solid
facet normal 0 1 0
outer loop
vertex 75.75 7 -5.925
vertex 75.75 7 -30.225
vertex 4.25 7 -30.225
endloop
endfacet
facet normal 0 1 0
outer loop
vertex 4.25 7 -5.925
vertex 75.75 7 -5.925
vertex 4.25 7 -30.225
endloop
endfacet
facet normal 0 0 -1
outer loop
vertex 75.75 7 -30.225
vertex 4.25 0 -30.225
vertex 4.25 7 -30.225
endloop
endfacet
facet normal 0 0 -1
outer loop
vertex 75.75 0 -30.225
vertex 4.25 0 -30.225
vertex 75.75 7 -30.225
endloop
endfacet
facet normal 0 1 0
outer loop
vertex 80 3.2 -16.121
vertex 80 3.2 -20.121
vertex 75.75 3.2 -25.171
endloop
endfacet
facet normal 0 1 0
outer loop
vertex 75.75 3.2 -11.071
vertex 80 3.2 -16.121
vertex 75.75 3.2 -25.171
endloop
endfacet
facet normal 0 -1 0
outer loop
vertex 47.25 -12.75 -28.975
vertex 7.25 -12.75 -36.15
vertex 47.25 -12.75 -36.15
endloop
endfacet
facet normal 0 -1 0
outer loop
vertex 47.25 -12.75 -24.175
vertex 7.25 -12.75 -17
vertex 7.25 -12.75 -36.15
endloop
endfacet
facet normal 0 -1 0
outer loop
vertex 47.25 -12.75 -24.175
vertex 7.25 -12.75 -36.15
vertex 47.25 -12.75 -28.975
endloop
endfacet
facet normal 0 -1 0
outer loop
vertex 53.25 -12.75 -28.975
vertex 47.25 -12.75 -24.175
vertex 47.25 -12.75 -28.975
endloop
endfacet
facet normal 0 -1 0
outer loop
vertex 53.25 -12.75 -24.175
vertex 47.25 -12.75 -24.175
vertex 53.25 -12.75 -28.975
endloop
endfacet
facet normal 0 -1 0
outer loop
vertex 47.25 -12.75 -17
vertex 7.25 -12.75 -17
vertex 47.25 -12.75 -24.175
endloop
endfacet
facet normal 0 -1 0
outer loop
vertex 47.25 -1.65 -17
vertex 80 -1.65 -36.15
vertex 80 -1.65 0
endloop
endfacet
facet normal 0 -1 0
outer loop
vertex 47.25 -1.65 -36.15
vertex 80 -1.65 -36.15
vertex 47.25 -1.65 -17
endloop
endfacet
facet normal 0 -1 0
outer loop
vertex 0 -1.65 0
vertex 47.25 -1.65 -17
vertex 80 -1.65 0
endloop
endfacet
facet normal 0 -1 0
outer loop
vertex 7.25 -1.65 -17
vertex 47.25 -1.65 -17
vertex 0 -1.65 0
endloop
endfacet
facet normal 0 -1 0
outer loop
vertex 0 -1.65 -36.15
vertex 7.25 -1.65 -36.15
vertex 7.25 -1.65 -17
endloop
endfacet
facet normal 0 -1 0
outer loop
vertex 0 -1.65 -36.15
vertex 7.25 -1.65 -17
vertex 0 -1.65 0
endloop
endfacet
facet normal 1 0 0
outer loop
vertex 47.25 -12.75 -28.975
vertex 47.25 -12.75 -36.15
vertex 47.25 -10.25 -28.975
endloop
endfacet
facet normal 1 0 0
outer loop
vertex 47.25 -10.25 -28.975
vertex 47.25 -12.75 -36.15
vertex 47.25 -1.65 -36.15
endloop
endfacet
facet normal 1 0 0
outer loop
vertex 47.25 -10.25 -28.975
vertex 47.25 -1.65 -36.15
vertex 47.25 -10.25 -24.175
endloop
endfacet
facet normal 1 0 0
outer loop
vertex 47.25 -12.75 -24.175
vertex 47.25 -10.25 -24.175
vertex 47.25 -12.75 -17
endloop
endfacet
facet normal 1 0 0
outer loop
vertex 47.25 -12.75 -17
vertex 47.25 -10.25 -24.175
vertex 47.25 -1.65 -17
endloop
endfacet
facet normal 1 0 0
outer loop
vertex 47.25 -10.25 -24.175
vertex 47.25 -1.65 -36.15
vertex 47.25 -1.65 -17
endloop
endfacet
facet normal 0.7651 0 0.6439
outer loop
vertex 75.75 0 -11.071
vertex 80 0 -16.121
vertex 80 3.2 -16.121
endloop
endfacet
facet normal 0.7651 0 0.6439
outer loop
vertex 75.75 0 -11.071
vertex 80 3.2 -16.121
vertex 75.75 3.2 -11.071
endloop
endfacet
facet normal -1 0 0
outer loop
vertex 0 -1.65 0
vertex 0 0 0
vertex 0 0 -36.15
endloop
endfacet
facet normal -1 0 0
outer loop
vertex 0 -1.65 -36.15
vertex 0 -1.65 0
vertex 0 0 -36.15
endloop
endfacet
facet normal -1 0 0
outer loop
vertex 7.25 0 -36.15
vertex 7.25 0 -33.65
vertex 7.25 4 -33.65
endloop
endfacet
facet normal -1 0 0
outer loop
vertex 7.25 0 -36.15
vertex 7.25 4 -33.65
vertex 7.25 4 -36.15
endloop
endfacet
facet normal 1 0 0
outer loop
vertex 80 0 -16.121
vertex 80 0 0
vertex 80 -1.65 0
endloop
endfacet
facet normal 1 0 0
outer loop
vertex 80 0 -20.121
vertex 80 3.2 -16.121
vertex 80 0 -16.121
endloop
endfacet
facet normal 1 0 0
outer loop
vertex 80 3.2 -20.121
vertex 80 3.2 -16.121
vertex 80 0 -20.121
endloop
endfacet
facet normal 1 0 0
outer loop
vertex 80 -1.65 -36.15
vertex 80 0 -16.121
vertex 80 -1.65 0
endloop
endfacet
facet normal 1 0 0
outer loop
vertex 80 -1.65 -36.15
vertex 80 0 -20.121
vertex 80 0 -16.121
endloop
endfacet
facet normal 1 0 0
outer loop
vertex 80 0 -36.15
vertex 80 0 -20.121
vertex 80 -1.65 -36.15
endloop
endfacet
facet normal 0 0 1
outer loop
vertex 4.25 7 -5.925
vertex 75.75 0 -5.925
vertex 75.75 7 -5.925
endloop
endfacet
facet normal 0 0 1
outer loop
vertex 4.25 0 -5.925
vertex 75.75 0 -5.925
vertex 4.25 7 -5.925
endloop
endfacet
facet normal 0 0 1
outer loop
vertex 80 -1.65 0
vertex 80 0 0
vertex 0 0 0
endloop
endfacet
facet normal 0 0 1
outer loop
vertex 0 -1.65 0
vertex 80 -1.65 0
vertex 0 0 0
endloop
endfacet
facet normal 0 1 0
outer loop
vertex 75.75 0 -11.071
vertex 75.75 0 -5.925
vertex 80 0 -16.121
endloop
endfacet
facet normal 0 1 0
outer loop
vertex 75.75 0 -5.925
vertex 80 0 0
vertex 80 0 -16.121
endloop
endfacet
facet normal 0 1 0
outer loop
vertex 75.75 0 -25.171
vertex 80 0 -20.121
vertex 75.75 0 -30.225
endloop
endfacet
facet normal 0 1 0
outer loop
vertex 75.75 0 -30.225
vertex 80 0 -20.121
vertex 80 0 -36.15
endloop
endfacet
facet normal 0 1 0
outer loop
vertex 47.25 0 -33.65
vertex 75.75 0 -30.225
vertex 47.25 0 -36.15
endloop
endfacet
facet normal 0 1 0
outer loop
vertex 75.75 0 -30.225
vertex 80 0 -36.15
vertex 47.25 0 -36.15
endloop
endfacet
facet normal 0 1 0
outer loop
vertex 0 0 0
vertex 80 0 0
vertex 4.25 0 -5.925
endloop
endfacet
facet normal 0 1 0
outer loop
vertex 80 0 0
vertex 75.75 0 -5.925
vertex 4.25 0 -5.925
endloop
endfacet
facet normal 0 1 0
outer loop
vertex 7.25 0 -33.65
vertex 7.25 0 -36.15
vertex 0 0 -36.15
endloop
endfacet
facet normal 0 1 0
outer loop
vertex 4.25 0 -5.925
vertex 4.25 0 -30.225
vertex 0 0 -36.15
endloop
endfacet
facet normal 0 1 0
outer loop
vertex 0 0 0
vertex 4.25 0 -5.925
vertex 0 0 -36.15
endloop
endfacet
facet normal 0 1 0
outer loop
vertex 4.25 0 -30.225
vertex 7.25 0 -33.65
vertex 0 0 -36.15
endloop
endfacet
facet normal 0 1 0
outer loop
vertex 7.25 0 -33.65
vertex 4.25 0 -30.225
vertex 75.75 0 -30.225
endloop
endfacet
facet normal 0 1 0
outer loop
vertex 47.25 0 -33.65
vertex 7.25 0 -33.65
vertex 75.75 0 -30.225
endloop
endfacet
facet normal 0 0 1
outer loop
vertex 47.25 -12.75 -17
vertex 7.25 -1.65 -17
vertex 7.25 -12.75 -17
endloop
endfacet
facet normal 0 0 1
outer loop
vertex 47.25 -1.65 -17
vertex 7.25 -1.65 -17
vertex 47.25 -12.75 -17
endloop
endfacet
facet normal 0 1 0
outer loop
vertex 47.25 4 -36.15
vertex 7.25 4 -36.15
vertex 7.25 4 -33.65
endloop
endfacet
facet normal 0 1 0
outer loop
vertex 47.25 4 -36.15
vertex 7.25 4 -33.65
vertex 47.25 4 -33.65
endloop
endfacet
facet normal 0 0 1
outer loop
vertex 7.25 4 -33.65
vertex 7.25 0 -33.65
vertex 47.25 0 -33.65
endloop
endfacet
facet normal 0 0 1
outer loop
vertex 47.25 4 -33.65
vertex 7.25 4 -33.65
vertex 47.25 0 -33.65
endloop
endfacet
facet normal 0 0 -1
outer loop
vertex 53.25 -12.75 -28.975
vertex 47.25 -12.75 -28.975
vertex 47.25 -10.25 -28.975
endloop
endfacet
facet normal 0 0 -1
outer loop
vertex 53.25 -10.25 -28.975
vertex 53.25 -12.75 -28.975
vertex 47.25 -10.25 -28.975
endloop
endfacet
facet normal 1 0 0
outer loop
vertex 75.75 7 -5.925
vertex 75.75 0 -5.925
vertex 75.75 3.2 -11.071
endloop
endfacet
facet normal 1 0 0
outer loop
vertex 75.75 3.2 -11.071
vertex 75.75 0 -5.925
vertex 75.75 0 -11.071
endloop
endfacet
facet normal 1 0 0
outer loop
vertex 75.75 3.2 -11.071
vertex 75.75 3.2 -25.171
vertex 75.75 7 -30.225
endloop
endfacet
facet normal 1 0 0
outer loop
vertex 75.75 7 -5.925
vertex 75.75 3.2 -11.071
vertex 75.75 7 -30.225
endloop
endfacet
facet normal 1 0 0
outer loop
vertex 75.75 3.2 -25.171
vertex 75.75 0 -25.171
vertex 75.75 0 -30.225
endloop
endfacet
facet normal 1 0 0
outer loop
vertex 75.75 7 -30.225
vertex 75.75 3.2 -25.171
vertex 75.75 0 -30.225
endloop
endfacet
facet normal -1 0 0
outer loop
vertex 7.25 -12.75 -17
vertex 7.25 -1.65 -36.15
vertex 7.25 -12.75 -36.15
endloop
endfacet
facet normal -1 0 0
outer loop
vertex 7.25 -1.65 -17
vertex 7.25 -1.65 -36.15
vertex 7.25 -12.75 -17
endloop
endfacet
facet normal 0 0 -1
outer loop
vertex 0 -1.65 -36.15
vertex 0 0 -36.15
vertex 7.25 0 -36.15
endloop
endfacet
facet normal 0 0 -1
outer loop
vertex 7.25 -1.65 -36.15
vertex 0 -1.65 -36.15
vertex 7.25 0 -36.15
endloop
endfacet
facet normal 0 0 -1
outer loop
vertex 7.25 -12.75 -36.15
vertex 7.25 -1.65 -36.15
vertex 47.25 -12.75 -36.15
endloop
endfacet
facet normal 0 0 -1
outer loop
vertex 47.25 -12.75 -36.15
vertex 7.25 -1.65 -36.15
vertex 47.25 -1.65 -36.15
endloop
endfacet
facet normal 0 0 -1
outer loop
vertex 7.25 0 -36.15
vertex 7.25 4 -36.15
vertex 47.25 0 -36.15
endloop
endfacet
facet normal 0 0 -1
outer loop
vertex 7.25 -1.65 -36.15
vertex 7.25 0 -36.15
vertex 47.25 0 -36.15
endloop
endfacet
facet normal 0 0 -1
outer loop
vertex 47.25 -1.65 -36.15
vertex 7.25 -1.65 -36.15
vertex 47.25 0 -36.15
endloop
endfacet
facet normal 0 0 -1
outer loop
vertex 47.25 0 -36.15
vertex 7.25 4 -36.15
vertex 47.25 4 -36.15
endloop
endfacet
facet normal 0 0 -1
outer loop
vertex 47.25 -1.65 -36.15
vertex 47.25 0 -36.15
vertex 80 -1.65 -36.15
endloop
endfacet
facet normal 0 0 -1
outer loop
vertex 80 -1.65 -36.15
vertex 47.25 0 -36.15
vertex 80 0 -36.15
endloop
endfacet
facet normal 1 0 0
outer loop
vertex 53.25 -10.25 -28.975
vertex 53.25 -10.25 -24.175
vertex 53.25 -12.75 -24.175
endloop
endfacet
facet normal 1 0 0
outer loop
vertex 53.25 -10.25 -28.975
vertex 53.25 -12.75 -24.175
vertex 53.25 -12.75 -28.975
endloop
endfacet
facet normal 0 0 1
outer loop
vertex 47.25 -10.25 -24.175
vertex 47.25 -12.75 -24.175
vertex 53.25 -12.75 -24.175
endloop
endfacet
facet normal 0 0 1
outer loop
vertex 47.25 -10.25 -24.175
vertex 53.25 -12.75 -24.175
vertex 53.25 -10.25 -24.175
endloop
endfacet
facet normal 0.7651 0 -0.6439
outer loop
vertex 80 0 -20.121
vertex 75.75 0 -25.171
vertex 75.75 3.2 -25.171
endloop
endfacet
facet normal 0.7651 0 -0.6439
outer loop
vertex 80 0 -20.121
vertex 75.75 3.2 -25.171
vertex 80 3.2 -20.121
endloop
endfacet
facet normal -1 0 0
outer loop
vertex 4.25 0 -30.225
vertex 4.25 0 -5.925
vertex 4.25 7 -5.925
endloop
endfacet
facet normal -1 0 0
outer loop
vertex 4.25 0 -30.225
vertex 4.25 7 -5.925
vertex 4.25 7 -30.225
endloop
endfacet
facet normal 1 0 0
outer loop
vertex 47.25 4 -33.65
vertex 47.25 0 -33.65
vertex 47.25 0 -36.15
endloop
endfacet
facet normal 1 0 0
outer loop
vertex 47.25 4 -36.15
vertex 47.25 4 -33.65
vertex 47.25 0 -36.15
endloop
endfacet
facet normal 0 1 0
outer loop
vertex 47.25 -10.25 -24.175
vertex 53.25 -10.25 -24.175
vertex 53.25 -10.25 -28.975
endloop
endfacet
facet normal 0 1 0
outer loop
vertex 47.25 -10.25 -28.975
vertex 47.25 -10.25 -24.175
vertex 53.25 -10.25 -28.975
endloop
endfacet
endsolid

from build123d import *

# Parameters (mm, degrees)
BOSS_EXTRUDE2_DEPTH = 1.65
BOSS_EXTRUDE3_DEPTH = 7
BOSS_EXTRUDE4_DEPTH = 3.2
SKETCH7_W           = 40
SKETCH7_H           = 2.5
BOSS_EXTRUDE5_DEPTH = 4
SKETCH8_W           = 40
SKETCH8_H           = 19.15
BOSS_EXTRUDE6_DEPTH = 11.1
SKETCH9_W           = 4.8
SKETCH9_H           = 2.5
BOSS_EXTRUDE7_DEPTH = 6


with BuildPart() as part:
    # Sketch3 → Boss-Extrude2 (new body)
    with BuildSketch(Plane(origin=(0, 0, 0), x_dir=(1, 0, 0), z_dir=(0, 1, 0))):
        Polygon((0, 0), (0, 36.15), (80, 36.15), (80, 20.120748629), (80, 16.120748629), (80, 0), align=None)
    extrude(amount=-BOSS_EXTRUDE2_DEPTH)

    # Sketch5 → Boss-Extrude3 (add)
    with BuildSketch(Plane(origin=(0, 0, 0), x_dir=(1, 0, 0), z_dir=(0, 1, 0))):
        Polygon((75.75, 11.070748629), (75.75, 5.925), (4.25, 5.925), (4.25, 30.225), (75.75, 30.225), (75.75, 25.170748629), align=None)
    extrude(amount=BOSS_EXTRUDE3_DEPTH)

    # Sketch6 → Boss-Extrude4 (add)
    with BuildSketch(Plane(origin=(0, 0, 0), x_dir=(1, 0, 0), z_dir=(0, 1, 0))):
        Polygon((80, 20.120748629), (80, 16.120748629), (75.75, 11.070748629), (75.75, 25.170748629), align=None)
    extrude(amount=BOSS_EXTRUDE4_DEPTH)

    # Sketch7 → Boss-Extrude5 (add)
    with BuildSketch(Plane(origin=(0, 0, 0), x_dir=(1, 0, 0), z_dir=(0, 1, 0))):
        with Locations((27.25, 34.9)):
            Rectangle(SKETCH7_W, SKETCH7_H)
    extrude(amount=BOSS_EXTRUDE5_DEPTH)

    # Sketch8 → Boss-Extrude6 (add)
    with BuildSketch(Plane.XZ.offset(1.65)):
        with Locations((27.25, -26.575)):
            Rectangle(SKETCH8_W, SKETCH8_H)
    extrude(amount=BOSS_EXTRUDE6_DEPTH)

    # Sketch9 → Boss-Extrude7 (add)
    with BuildSketch(Plane(origin=(47.25, 0, 0), x_dir=(0, 0, -1), z_dir=(1, 0, 0))):
        with Locations((26.575, -11.5)):
            Rectangle(SKETCH9_W, SKETCH9_H)
    extrude(amount=BOSS_EXTRUDE7_DEPTH)


solid = part.part
